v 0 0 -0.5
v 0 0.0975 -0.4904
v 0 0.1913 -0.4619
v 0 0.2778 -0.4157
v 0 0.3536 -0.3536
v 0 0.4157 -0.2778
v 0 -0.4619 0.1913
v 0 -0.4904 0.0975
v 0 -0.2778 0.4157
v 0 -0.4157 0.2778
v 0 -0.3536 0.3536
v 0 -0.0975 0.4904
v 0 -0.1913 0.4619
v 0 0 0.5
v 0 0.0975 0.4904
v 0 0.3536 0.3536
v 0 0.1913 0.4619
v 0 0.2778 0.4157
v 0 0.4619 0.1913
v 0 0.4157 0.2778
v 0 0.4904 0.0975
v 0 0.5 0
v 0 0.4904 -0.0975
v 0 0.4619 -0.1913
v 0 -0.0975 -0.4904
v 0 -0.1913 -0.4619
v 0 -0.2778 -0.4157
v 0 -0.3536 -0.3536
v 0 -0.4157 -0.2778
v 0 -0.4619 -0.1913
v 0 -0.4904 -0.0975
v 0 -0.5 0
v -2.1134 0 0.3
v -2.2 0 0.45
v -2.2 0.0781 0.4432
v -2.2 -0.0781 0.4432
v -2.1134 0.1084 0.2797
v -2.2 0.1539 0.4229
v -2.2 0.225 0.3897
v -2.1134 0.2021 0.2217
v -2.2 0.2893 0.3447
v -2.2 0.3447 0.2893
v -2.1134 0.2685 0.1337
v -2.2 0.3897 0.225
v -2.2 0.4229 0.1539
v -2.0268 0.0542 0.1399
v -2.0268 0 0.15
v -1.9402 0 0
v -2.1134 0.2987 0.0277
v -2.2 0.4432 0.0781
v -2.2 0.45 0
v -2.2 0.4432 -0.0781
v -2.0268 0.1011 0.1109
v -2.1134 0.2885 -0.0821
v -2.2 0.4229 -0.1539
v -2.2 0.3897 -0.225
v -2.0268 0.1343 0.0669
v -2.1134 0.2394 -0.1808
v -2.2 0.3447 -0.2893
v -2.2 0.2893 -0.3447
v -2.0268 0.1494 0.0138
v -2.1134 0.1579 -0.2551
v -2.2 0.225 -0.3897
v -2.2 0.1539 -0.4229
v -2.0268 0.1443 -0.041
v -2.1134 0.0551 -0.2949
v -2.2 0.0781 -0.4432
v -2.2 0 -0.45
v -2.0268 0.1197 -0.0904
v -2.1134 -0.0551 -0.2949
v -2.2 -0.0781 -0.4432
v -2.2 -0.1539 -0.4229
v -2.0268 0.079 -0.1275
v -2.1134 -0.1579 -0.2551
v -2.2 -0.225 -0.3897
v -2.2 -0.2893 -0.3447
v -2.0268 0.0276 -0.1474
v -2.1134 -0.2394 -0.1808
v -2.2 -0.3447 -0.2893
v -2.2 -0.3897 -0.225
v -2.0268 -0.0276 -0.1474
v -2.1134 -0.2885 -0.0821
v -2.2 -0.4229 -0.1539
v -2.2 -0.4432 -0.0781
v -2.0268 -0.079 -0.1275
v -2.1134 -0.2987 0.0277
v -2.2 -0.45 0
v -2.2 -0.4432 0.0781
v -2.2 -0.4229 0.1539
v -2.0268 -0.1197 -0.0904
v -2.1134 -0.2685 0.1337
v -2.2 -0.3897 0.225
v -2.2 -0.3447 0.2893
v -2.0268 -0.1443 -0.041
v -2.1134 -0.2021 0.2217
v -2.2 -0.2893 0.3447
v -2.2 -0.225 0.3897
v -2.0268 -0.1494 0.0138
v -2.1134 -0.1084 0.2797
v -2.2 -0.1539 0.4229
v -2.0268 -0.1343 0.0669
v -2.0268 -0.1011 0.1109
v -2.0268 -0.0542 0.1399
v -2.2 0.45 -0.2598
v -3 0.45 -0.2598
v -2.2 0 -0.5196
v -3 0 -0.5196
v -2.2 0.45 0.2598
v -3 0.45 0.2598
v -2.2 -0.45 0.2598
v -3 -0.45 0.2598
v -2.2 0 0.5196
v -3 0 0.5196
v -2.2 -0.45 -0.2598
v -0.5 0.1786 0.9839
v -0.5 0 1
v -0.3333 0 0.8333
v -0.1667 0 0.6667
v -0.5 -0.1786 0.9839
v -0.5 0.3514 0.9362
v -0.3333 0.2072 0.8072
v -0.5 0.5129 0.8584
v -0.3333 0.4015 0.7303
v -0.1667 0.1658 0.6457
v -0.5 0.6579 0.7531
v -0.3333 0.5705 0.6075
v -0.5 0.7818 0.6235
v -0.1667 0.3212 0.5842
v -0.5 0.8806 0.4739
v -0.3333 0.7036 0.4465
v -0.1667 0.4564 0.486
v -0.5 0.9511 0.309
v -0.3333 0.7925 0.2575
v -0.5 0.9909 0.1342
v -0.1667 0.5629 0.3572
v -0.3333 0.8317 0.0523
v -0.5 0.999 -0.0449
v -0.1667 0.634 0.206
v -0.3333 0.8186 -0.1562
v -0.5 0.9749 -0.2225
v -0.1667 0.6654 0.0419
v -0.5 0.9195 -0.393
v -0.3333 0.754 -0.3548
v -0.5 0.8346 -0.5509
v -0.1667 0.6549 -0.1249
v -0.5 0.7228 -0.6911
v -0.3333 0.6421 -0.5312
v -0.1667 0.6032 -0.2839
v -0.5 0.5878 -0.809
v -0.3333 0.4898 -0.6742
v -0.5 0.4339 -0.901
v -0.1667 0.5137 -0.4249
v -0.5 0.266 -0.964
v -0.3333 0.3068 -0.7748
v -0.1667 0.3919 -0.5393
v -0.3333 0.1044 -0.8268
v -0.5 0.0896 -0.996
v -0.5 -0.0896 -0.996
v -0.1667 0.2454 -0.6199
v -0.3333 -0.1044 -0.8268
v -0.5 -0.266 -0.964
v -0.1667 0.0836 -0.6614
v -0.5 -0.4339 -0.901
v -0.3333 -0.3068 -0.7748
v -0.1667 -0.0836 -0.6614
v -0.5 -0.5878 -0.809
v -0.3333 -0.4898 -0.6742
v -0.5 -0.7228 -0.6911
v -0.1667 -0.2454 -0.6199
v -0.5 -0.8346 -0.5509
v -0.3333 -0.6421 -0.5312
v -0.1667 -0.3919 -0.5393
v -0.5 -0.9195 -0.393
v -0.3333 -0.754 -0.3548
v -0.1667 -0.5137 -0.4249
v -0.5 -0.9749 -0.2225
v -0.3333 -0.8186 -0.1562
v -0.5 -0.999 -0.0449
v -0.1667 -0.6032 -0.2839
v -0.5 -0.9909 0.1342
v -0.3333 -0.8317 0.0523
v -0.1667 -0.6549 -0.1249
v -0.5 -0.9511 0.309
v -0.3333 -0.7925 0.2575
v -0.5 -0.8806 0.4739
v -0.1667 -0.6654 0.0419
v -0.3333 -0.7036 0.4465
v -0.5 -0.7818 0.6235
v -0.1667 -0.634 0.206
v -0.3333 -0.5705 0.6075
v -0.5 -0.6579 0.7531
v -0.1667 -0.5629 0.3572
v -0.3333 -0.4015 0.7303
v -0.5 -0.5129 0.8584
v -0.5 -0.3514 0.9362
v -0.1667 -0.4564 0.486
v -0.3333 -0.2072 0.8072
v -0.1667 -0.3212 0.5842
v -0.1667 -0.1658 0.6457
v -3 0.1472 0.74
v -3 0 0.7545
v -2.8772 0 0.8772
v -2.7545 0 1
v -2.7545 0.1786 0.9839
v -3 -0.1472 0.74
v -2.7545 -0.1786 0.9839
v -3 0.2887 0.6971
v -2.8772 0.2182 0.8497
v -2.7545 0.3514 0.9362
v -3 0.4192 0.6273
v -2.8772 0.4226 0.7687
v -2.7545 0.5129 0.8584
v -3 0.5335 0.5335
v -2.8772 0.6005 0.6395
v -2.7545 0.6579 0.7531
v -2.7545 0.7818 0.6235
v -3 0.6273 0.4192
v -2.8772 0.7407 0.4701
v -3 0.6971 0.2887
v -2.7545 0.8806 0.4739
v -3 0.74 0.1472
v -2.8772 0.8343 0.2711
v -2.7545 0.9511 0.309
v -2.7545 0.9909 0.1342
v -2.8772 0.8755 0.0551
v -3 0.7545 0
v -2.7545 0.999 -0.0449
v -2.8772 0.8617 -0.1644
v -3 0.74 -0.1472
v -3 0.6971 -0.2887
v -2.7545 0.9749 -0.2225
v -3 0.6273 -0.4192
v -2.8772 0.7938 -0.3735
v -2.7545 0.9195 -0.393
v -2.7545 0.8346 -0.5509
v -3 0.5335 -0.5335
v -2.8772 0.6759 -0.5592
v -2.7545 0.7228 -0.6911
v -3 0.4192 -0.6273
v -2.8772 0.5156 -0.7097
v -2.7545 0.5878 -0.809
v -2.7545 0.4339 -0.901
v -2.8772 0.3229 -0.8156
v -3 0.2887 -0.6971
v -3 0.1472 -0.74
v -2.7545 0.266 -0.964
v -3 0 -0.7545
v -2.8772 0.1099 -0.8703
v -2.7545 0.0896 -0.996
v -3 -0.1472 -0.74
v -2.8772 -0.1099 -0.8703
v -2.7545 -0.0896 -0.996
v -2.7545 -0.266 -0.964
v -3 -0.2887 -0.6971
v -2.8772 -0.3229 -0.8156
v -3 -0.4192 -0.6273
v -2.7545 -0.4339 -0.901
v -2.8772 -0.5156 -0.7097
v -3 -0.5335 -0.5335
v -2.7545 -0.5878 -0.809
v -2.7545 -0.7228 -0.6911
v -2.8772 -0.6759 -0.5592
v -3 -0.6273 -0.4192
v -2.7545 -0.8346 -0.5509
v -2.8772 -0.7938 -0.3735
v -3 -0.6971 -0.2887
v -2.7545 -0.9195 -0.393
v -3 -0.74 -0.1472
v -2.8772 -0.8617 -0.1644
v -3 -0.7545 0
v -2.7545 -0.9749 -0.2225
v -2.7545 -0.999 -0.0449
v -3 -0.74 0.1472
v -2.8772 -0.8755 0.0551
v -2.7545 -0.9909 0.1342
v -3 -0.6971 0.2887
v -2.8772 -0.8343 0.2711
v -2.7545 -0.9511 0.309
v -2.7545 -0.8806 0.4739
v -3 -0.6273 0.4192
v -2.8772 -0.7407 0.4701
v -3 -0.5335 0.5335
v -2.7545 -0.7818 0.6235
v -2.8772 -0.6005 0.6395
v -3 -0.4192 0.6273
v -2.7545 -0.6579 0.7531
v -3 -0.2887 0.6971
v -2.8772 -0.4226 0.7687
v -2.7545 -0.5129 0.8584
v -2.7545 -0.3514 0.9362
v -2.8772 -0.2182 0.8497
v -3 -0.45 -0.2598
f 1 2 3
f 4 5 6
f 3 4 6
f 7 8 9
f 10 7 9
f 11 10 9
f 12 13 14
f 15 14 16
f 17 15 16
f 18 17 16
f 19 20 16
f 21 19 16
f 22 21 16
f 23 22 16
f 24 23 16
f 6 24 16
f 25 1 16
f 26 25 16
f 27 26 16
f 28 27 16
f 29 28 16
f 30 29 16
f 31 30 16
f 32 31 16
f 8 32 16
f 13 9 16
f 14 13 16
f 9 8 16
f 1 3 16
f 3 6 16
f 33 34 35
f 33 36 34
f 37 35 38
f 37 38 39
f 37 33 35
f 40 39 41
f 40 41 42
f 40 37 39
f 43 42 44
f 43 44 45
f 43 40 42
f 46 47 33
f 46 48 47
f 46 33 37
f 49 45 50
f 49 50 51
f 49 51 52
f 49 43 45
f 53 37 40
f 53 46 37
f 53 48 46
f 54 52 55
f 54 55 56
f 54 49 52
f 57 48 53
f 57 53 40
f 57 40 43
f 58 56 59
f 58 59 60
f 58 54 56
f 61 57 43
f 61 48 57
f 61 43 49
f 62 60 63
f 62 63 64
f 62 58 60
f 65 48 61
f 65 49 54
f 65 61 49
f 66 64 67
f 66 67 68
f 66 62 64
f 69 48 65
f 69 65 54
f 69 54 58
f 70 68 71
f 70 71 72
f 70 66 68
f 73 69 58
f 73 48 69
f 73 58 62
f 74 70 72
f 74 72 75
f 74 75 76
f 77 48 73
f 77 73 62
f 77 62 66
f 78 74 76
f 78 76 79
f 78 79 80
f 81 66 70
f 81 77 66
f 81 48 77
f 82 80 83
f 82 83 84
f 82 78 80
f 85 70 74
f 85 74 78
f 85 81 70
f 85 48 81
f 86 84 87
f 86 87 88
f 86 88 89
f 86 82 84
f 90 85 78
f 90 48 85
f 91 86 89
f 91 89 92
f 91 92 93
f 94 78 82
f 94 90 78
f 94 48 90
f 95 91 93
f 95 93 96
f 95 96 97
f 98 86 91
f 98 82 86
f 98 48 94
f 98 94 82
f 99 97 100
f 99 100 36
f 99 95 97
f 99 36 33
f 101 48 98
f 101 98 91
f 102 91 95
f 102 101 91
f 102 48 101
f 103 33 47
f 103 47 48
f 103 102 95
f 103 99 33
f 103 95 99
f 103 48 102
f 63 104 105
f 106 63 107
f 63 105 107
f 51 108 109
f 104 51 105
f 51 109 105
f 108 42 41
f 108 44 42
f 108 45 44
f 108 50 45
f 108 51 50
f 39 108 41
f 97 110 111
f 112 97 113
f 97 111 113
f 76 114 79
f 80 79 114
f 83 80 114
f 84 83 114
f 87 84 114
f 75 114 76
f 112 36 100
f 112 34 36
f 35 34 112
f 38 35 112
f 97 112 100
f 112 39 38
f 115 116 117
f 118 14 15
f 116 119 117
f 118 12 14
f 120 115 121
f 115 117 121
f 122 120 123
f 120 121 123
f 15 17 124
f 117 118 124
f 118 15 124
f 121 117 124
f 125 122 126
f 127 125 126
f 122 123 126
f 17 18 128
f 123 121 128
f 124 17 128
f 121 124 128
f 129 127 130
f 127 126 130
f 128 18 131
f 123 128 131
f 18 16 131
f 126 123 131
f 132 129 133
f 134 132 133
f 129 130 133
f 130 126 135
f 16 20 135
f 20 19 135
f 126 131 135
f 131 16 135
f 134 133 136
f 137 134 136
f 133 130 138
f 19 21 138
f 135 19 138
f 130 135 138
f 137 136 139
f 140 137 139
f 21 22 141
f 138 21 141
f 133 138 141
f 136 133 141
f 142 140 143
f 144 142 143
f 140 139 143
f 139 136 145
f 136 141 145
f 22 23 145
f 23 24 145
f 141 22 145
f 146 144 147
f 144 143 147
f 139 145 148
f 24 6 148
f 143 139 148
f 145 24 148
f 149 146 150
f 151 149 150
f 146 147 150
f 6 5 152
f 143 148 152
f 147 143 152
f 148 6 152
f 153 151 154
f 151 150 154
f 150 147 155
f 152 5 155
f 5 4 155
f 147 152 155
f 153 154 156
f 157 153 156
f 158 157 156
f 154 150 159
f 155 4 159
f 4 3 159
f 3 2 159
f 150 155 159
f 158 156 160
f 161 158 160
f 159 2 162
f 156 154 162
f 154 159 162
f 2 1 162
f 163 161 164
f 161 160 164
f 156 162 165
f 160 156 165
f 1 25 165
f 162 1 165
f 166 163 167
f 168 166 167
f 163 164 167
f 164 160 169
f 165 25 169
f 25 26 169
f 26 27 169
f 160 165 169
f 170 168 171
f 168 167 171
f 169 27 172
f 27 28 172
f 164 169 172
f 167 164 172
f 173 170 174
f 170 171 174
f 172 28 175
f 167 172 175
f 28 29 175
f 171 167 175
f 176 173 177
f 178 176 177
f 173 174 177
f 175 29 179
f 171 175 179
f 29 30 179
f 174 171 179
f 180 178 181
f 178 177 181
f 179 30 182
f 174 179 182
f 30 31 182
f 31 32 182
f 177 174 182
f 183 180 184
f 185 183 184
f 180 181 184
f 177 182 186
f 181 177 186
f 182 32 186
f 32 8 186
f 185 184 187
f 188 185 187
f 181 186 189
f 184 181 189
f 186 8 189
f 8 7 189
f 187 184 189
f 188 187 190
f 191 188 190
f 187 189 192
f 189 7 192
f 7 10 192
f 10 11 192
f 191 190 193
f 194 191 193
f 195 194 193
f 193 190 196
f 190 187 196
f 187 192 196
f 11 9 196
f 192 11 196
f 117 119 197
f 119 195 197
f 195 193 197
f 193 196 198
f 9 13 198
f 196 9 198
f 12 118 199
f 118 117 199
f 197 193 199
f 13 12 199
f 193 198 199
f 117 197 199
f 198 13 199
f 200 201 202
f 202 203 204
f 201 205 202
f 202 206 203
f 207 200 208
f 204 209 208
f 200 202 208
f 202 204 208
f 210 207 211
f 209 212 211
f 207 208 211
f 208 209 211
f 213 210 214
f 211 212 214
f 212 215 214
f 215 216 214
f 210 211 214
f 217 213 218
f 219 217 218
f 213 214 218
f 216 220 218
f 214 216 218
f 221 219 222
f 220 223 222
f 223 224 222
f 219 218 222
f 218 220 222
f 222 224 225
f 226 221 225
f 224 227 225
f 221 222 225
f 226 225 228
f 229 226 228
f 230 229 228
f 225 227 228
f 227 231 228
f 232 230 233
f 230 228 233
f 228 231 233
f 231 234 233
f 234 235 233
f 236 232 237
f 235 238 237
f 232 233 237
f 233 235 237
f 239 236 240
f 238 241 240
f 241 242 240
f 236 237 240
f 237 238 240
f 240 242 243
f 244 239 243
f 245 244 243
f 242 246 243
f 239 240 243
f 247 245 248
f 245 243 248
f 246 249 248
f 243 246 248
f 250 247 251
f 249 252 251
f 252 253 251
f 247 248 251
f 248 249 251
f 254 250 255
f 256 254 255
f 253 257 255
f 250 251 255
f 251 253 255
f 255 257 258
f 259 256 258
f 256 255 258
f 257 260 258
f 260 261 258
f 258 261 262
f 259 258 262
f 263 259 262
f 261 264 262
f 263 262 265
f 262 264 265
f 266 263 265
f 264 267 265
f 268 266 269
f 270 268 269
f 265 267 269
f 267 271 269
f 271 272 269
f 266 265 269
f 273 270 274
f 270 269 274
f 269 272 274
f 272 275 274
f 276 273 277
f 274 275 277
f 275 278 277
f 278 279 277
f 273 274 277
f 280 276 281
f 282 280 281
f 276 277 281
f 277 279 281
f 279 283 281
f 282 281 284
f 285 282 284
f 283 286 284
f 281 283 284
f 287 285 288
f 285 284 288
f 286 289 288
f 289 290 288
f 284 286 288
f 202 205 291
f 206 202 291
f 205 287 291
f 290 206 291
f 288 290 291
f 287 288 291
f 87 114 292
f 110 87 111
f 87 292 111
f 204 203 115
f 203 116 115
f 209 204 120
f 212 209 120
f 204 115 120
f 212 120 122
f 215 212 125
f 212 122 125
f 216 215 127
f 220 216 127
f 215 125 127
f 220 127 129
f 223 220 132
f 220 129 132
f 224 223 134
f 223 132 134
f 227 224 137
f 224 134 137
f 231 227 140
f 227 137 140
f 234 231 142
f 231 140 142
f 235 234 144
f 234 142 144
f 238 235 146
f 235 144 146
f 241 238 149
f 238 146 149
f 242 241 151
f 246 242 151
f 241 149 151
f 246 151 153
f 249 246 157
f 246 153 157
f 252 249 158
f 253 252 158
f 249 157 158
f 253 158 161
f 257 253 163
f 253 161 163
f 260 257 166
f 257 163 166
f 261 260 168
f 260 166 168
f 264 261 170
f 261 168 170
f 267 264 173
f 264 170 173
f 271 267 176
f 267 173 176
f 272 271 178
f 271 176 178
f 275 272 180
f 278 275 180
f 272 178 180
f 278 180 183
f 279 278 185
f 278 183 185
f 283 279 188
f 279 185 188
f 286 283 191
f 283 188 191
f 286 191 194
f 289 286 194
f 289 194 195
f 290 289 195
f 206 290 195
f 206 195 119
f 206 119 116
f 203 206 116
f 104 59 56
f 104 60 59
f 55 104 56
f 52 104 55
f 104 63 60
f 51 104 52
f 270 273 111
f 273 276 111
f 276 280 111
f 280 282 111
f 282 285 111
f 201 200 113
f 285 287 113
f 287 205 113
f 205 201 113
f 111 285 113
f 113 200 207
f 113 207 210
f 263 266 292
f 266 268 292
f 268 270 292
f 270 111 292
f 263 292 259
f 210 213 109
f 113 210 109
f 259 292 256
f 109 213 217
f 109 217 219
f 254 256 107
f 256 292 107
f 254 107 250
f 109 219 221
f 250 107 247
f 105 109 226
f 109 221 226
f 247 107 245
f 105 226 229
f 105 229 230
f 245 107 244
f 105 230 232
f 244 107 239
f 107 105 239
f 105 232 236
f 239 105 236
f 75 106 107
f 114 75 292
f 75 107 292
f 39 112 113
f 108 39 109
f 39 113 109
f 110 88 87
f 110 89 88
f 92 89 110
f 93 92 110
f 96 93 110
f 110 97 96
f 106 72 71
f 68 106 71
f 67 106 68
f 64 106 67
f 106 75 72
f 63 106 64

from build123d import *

# Parameters (mm, degrees)
CUT_EXTRUDE1_DEPTH = 0.8


with BuildPart() as part:
    # Sketch1 → Revolve1 (revolve)
    with BuildSketch(Plane.XY, mode=Mode.PRIVATE) as revolve1_sk:
        Polygon((-3, 0), (-3, 0.7545), (-2.7545, 1), (-0.5, 1), (0, 0.5), (0, 0), align=None)
    revolve(revolve1_sk.sketch.rotate(Axis((0, 0, 0), (-1, 0, 0)), 270), axis=Axis((0, 0, 0), (-1, 0, 0)))

    # Sketch2 → Cut-Extrude1 (cut)
    with BuildSketch(Plane.ZY.offset(3)):
        Polygon((-0.259807621, -0.45), (0.259807621, -0.45), (0.519615242, 0), (0.259807621, 0.45), (-0.259807621, 0.45), (-0.519615242, 0), align=None)
    extrude(amount=-CUT_EXTRUDE1_DEPTH, mode=Mode.SUBTRACT)

    # Sketch3 → Cut-Revolve1 (revolve, cut)
    with BuildSketch(Plane.XY, mode=Mode.PRIVATE) as cut_revolve1_sk:
        Polygon((-2.2, 0), (-2.2, 0.45), (-1.940192379, 0), align=None)
    revolve(cut_revolve1_sk.sketch.rotate(Axis((-1.940192379, 0, 0), (-1, 0, 0)), 270), axis=Axis((-1.940192379, 0, 0), (-1, 0, 0)), mode=Mode.SUBTRACT)


solid = part.part
